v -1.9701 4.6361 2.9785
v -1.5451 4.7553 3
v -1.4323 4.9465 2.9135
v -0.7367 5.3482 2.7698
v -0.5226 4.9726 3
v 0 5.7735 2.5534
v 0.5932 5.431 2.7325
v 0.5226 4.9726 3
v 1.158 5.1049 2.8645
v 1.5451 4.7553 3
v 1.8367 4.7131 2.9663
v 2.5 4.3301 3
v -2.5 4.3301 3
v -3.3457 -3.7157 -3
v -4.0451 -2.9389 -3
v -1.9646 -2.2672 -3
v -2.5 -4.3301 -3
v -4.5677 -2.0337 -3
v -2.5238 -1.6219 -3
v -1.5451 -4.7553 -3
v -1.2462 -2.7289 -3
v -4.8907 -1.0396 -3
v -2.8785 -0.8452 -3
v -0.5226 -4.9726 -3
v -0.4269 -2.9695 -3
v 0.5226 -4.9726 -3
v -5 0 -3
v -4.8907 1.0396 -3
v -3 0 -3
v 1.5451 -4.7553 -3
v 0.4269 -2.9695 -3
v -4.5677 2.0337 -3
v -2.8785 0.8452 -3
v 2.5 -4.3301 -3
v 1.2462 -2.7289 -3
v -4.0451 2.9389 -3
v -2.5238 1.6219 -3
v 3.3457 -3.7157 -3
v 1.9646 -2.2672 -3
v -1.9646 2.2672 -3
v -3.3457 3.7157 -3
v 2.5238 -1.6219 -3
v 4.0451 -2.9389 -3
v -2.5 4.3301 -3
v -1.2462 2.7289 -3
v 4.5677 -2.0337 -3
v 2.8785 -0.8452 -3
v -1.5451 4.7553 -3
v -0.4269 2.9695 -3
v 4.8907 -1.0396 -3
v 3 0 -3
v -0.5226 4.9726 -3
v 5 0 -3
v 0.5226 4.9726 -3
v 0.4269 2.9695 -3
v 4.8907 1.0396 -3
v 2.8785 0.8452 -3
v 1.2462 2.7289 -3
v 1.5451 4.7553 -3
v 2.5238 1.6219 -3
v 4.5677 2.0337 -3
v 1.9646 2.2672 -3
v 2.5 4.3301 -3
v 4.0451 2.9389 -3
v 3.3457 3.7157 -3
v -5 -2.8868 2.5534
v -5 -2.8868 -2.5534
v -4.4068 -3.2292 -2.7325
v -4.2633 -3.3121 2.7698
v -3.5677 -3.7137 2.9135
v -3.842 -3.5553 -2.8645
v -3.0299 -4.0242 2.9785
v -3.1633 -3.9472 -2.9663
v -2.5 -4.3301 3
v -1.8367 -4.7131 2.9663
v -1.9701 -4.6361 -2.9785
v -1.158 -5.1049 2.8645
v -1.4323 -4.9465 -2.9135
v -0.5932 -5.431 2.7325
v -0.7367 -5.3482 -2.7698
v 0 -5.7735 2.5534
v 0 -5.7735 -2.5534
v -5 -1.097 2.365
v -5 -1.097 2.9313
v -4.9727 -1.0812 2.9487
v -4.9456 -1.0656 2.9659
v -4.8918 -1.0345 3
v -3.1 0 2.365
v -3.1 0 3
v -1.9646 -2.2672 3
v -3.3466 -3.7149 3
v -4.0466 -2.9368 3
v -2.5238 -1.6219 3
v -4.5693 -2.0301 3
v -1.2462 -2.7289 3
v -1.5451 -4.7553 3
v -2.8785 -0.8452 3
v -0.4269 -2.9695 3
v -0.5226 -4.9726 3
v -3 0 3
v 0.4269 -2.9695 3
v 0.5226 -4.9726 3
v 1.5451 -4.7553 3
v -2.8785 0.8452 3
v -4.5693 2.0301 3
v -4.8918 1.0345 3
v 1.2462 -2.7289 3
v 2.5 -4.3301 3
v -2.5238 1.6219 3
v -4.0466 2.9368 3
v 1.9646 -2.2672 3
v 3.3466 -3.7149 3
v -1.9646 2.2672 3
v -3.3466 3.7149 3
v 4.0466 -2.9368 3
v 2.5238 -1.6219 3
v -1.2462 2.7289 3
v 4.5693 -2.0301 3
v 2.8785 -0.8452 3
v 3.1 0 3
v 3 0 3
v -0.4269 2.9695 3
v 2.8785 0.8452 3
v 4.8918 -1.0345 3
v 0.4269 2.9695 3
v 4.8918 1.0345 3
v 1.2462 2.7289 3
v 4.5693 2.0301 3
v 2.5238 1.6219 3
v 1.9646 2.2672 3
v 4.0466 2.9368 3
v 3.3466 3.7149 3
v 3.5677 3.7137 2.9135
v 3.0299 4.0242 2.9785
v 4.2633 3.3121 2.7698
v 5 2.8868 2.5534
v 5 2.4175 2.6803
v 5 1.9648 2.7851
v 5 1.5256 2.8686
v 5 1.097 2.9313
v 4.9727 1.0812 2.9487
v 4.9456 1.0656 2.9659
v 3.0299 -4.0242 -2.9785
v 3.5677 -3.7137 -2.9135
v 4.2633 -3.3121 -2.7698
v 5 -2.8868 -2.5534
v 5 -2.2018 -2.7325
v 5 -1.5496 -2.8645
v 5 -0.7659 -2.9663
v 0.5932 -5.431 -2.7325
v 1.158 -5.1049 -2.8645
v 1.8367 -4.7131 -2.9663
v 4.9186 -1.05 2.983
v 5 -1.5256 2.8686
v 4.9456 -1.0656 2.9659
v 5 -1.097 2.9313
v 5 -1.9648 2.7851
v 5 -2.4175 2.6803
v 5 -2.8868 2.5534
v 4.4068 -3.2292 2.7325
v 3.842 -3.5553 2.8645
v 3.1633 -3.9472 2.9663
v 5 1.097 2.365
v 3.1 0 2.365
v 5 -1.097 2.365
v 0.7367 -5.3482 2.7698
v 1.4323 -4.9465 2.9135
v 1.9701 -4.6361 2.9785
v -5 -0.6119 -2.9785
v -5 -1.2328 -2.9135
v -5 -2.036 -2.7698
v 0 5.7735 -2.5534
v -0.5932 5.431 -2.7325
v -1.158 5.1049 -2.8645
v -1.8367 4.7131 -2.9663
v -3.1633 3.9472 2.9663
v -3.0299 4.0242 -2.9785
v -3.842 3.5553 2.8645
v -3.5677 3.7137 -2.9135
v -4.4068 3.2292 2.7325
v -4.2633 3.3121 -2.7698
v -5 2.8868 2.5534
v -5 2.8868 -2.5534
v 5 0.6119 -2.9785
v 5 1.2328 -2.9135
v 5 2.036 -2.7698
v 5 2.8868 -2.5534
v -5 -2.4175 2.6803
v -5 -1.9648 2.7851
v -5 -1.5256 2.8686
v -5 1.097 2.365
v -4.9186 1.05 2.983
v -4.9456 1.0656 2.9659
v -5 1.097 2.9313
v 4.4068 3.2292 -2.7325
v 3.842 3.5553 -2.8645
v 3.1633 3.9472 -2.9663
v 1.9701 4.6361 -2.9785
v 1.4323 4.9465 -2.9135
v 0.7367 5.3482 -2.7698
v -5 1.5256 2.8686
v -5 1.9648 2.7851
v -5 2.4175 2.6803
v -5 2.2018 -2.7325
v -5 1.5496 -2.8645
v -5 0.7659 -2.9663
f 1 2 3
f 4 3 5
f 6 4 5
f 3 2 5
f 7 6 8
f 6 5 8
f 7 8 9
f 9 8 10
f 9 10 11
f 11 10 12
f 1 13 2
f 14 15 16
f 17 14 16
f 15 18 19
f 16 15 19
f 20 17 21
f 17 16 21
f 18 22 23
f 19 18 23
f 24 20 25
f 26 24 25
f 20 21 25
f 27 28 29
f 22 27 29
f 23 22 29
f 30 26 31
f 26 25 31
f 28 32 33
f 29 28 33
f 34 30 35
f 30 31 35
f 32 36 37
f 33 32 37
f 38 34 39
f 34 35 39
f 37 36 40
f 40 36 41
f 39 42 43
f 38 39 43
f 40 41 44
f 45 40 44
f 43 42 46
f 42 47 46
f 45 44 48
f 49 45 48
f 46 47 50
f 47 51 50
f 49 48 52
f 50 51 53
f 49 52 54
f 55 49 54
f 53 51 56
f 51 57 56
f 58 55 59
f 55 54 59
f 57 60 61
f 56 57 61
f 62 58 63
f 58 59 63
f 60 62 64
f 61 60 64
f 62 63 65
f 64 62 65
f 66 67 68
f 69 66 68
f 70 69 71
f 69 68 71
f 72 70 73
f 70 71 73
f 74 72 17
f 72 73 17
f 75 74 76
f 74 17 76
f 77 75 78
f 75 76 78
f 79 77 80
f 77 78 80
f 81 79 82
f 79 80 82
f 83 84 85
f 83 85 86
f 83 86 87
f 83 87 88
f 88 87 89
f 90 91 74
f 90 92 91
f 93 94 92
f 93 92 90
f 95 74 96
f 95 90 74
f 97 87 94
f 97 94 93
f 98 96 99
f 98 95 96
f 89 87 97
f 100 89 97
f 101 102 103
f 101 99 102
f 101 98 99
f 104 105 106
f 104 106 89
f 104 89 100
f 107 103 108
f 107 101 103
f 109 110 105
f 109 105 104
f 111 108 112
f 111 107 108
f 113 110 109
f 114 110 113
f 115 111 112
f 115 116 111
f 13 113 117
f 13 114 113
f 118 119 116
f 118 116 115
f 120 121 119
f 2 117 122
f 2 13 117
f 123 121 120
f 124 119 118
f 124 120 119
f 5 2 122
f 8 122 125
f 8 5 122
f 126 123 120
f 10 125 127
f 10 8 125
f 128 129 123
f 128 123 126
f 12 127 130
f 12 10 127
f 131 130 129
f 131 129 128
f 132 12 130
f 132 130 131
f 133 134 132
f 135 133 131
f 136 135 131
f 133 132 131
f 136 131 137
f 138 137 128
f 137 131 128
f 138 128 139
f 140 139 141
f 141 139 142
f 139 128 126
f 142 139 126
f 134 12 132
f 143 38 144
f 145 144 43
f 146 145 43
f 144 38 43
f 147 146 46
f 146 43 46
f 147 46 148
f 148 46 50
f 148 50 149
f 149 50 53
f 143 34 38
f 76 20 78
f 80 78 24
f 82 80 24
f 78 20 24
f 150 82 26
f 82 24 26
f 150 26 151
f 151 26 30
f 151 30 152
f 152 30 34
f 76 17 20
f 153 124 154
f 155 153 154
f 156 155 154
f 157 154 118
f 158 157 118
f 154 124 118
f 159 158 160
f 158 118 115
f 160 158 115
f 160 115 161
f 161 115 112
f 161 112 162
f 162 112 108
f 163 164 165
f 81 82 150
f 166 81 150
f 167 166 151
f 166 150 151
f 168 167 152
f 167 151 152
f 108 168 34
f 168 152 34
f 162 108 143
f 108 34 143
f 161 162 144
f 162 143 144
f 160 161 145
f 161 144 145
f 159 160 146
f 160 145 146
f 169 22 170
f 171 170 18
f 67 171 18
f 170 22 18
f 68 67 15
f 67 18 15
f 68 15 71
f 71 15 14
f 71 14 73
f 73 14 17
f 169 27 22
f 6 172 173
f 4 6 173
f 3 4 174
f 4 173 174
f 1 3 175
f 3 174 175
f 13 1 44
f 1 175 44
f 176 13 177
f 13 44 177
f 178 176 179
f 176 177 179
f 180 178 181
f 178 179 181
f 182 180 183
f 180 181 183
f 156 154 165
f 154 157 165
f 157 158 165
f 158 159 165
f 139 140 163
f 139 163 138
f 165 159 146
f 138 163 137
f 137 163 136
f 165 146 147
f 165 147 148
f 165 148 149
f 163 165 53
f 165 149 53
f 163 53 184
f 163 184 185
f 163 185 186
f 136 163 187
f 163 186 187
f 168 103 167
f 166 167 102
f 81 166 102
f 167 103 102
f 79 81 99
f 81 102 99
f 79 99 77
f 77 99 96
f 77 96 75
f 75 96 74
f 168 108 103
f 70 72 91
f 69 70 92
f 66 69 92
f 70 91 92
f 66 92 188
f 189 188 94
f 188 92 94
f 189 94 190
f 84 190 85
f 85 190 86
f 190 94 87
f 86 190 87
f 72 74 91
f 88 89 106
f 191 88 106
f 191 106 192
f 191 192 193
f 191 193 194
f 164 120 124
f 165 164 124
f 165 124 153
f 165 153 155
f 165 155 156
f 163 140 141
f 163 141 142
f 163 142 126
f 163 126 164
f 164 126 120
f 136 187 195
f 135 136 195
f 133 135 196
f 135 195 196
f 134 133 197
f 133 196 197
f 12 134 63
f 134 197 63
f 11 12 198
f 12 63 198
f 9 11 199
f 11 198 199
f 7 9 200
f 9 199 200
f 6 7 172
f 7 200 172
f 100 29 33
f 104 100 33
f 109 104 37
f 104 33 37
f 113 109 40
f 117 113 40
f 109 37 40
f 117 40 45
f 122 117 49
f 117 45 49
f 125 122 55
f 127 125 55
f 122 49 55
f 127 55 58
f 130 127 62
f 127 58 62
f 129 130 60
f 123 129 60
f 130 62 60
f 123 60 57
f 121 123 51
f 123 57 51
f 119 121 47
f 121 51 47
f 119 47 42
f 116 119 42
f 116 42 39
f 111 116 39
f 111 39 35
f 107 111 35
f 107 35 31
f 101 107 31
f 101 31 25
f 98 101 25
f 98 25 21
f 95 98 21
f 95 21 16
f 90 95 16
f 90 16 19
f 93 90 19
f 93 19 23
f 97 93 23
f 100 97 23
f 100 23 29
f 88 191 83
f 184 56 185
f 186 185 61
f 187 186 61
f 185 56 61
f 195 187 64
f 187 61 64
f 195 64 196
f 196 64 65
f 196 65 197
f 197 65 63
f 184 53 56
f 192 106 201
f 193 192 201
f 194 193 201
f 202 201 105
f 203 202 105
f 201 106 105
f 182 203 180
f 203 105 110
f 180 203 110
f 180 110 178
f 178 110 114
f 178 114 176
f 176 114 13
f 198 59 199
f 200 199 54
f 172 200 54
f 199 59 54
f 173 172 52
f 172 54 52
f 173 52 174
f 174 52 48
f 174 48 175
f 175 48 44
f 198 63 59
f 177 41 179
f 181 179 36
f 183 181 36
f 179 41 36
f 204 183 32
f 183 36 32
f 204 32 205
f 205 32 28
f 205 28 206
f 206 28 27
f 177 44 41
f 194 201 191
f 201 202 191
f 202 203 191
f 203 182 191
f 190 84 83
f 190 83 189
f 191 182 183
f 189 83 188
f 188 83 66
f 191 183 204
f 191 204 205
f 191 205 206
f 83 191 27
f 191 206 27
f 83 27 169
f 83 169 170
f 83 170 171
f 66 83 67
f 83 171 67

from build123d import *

# Parameters (mm, degrees)
EXTRUDE1_DEPTH      = 3
EXTRUDE1_DEPTH_BACK = 3
SKETCH2_OUTSIDE_W   = 52.392
SKETCH2_OUTSIDE_H   = 53.94
SKETCH2_OUTSIDE_R   = 5
CUT_EXTRUDE1_DEPTH  = 10.712534856
CUT_EXTRUDE1_DRAFT  = 60
SKETCH3_OUTSIDE_W   = 52.392
SKETCH3_OUTSIDE_H   = 53.94
SKETCH3_OUTSIDE_R   = 5
CUT_EXTRUDE2_DEPTH  = 10.712534856
CUT_EXTRUDE2_DRAFT  = 60
SKETCH4_R           = 3
CUT_EXTRUDE3_DEPTH  = 10.712534856
CUT_EXTRUDE7_DEPTH  = 0.635


with BuildPart() as part:
    # Sketch1 → Extrude1 (new, two sides: drawn at the far end of the back side and taken through both)
    with BuildSketch(Plane.XY.offset(-EXTRUDE1_DEPTH_BACK)):
        Polygon((0, 5.773502692), (-5, 2.886751346), (-5, -2.886751346), (0, -5.773502692), (5, -2.886751346), (5, 2.886751346), align=None)
    extrude(amount=EXTRUDE1_DEPTH + EXTRUDE1_DEPTH_BACK)


with BuildPart() as cut_extrude1_tool:
    # Sketch2 outside → Cut-Extrude1 (with draft: the straight prism first)
    with BuildSketch(Plane(origin=(0, 0, 3), x_dir=(-1, 0, 0), z_dir=(0, 0, -1))):
        Rectangle(SKETCH2_OUTSIDE_W, SKETCH2_OUTSIDE_H)
        Circle(SKETCH2_OUTSIDE_R, mode=Mode.SUBTRACT)
    extrude(amount=CUT_EXTRUDE1_DEPTH)
    # Cut-Extrude1: the draft: its side faces are tilted about the plane it starts from
    cut_extrude1_sides = [cut_extrude1_tool.faces().sort_by_distance(p)[0] for p in [
        (0, -26.97, -2.356267428),
        (-26.196, 0, -2.356267428),
        (0, 26.97, -2.356267428),
        (26.196, 0, -2.356267428),
        (5, 0, -2.356267428),
    ]]
    draft(cut_extrude1_sides, Plane(origin=(0, 0, 3), x_dir=(-1, 0, 0), z_dir=(0, 0, -1)), CUT_EXTRUDE1_DRAFT)


with BuildPart() as part_1:
    add(part.part)

    # Cut-Extrude1: cut by cut_extrude1_tool
    add(cut_extrude1_tool.part, mode=Mode.SUBTRACT)


with BuildPart() as cut_extrude2_tool:
    # Sketch3 outside → Cut-Extrude2 (with draft: the straight prism first)
    with BuildSketch(Plane.XY.offset(-3)):
        Rectangle(SKETCH3_OUTSIDE_W, SKETCH3_OUTSIDE_H)
        Circle(SKETCH3_OUTSIDE_R, mode=Mode.SUBTRACT)
    extrude(amount=CUT_EXTRUDE2_DEPTH)
    # Cut-Extrude2: the draft: its side faces are tilted about the plane it starts from
    cut_extrude2_sides = [cut_extrude2_tool.faces().sort_by_distance(p)[0] for p in [
        (0, -26.97, 2.356267428),
        (26.196, 0, 2.356267428),
        (0, 26.97, 2.356267428),
        (-26.196, 0, 2.356267428),
        (-5, 0, 2.356267428),
    ]]
    draft(cut_extrude2_sides, Plane.XY.offset(-3), CUT_EXTRUDE2_DRAFT)


with BuildPart() as part_2:
    add(part_1.part)

    # Cut-Extrude2: cut by cut_extrude2_tool
    add(cut_extrude2_tool.part, mode=Mode.SUBTRACT)

    # Sketch4 → Cut-Extrude3 (cut, through all)
    with BuildSketch(Plane(origin=(0, 0, -3), x_dir=(-1, 0, 0), z_dir=(0, 0, -1))):
        Circle(SKETCH4_R)
    extrude(amount=-CUT_EXTRUDE3_DEPTH, mode=Mode.SUBTRACT)

    # Sketch12 → Cut-Extrude7 (cut)
    with BuildSketch(Plane.XY.offset(3)):
        Polygon((-3.1, 0), (-5, 1.096965511), (-5, -1.096965511), align=None)
        Polygon((3.1, 0), (5, -1.096965511), (5, 1.096965511), align=None)
    extrude(amount=-CUT_EXTRUDE7_DEPTH, mode=Mode.SUBTRACT)


solid = part_2.part
